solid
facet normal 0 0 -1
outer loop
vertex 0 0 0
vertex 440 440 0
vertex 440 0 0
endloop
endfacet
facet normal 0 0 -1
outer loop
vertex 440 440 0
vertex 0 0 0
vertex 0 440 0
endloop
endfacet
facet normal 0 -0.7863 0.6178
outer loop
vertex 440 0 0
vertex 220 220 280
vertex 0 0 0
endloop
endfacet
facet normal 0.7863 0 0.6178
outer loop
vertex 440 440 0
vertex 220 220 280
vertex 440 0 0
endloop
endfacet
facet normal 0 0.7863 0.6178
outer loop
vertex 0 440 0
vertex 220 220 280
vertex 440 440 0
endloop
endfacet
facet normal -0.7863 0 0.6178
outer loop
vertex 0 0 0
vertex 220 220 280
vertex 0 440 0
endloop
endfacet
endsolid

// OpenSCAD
// Unit of length: Unit.MM
polyhedron(points = [[0.0, 0.0, 0.0], [440.0, 0.0, 0.0], [440.0, 440.0, 0.0], [0.0, 440.0, 0.0], [220.0, 220.0, 280.0]], faces = [[0, 1, 2, 3], [0, 4, 1], [1, 4, 2], [2, 4, 3], [3, 4, 0]], convexity = 1);
